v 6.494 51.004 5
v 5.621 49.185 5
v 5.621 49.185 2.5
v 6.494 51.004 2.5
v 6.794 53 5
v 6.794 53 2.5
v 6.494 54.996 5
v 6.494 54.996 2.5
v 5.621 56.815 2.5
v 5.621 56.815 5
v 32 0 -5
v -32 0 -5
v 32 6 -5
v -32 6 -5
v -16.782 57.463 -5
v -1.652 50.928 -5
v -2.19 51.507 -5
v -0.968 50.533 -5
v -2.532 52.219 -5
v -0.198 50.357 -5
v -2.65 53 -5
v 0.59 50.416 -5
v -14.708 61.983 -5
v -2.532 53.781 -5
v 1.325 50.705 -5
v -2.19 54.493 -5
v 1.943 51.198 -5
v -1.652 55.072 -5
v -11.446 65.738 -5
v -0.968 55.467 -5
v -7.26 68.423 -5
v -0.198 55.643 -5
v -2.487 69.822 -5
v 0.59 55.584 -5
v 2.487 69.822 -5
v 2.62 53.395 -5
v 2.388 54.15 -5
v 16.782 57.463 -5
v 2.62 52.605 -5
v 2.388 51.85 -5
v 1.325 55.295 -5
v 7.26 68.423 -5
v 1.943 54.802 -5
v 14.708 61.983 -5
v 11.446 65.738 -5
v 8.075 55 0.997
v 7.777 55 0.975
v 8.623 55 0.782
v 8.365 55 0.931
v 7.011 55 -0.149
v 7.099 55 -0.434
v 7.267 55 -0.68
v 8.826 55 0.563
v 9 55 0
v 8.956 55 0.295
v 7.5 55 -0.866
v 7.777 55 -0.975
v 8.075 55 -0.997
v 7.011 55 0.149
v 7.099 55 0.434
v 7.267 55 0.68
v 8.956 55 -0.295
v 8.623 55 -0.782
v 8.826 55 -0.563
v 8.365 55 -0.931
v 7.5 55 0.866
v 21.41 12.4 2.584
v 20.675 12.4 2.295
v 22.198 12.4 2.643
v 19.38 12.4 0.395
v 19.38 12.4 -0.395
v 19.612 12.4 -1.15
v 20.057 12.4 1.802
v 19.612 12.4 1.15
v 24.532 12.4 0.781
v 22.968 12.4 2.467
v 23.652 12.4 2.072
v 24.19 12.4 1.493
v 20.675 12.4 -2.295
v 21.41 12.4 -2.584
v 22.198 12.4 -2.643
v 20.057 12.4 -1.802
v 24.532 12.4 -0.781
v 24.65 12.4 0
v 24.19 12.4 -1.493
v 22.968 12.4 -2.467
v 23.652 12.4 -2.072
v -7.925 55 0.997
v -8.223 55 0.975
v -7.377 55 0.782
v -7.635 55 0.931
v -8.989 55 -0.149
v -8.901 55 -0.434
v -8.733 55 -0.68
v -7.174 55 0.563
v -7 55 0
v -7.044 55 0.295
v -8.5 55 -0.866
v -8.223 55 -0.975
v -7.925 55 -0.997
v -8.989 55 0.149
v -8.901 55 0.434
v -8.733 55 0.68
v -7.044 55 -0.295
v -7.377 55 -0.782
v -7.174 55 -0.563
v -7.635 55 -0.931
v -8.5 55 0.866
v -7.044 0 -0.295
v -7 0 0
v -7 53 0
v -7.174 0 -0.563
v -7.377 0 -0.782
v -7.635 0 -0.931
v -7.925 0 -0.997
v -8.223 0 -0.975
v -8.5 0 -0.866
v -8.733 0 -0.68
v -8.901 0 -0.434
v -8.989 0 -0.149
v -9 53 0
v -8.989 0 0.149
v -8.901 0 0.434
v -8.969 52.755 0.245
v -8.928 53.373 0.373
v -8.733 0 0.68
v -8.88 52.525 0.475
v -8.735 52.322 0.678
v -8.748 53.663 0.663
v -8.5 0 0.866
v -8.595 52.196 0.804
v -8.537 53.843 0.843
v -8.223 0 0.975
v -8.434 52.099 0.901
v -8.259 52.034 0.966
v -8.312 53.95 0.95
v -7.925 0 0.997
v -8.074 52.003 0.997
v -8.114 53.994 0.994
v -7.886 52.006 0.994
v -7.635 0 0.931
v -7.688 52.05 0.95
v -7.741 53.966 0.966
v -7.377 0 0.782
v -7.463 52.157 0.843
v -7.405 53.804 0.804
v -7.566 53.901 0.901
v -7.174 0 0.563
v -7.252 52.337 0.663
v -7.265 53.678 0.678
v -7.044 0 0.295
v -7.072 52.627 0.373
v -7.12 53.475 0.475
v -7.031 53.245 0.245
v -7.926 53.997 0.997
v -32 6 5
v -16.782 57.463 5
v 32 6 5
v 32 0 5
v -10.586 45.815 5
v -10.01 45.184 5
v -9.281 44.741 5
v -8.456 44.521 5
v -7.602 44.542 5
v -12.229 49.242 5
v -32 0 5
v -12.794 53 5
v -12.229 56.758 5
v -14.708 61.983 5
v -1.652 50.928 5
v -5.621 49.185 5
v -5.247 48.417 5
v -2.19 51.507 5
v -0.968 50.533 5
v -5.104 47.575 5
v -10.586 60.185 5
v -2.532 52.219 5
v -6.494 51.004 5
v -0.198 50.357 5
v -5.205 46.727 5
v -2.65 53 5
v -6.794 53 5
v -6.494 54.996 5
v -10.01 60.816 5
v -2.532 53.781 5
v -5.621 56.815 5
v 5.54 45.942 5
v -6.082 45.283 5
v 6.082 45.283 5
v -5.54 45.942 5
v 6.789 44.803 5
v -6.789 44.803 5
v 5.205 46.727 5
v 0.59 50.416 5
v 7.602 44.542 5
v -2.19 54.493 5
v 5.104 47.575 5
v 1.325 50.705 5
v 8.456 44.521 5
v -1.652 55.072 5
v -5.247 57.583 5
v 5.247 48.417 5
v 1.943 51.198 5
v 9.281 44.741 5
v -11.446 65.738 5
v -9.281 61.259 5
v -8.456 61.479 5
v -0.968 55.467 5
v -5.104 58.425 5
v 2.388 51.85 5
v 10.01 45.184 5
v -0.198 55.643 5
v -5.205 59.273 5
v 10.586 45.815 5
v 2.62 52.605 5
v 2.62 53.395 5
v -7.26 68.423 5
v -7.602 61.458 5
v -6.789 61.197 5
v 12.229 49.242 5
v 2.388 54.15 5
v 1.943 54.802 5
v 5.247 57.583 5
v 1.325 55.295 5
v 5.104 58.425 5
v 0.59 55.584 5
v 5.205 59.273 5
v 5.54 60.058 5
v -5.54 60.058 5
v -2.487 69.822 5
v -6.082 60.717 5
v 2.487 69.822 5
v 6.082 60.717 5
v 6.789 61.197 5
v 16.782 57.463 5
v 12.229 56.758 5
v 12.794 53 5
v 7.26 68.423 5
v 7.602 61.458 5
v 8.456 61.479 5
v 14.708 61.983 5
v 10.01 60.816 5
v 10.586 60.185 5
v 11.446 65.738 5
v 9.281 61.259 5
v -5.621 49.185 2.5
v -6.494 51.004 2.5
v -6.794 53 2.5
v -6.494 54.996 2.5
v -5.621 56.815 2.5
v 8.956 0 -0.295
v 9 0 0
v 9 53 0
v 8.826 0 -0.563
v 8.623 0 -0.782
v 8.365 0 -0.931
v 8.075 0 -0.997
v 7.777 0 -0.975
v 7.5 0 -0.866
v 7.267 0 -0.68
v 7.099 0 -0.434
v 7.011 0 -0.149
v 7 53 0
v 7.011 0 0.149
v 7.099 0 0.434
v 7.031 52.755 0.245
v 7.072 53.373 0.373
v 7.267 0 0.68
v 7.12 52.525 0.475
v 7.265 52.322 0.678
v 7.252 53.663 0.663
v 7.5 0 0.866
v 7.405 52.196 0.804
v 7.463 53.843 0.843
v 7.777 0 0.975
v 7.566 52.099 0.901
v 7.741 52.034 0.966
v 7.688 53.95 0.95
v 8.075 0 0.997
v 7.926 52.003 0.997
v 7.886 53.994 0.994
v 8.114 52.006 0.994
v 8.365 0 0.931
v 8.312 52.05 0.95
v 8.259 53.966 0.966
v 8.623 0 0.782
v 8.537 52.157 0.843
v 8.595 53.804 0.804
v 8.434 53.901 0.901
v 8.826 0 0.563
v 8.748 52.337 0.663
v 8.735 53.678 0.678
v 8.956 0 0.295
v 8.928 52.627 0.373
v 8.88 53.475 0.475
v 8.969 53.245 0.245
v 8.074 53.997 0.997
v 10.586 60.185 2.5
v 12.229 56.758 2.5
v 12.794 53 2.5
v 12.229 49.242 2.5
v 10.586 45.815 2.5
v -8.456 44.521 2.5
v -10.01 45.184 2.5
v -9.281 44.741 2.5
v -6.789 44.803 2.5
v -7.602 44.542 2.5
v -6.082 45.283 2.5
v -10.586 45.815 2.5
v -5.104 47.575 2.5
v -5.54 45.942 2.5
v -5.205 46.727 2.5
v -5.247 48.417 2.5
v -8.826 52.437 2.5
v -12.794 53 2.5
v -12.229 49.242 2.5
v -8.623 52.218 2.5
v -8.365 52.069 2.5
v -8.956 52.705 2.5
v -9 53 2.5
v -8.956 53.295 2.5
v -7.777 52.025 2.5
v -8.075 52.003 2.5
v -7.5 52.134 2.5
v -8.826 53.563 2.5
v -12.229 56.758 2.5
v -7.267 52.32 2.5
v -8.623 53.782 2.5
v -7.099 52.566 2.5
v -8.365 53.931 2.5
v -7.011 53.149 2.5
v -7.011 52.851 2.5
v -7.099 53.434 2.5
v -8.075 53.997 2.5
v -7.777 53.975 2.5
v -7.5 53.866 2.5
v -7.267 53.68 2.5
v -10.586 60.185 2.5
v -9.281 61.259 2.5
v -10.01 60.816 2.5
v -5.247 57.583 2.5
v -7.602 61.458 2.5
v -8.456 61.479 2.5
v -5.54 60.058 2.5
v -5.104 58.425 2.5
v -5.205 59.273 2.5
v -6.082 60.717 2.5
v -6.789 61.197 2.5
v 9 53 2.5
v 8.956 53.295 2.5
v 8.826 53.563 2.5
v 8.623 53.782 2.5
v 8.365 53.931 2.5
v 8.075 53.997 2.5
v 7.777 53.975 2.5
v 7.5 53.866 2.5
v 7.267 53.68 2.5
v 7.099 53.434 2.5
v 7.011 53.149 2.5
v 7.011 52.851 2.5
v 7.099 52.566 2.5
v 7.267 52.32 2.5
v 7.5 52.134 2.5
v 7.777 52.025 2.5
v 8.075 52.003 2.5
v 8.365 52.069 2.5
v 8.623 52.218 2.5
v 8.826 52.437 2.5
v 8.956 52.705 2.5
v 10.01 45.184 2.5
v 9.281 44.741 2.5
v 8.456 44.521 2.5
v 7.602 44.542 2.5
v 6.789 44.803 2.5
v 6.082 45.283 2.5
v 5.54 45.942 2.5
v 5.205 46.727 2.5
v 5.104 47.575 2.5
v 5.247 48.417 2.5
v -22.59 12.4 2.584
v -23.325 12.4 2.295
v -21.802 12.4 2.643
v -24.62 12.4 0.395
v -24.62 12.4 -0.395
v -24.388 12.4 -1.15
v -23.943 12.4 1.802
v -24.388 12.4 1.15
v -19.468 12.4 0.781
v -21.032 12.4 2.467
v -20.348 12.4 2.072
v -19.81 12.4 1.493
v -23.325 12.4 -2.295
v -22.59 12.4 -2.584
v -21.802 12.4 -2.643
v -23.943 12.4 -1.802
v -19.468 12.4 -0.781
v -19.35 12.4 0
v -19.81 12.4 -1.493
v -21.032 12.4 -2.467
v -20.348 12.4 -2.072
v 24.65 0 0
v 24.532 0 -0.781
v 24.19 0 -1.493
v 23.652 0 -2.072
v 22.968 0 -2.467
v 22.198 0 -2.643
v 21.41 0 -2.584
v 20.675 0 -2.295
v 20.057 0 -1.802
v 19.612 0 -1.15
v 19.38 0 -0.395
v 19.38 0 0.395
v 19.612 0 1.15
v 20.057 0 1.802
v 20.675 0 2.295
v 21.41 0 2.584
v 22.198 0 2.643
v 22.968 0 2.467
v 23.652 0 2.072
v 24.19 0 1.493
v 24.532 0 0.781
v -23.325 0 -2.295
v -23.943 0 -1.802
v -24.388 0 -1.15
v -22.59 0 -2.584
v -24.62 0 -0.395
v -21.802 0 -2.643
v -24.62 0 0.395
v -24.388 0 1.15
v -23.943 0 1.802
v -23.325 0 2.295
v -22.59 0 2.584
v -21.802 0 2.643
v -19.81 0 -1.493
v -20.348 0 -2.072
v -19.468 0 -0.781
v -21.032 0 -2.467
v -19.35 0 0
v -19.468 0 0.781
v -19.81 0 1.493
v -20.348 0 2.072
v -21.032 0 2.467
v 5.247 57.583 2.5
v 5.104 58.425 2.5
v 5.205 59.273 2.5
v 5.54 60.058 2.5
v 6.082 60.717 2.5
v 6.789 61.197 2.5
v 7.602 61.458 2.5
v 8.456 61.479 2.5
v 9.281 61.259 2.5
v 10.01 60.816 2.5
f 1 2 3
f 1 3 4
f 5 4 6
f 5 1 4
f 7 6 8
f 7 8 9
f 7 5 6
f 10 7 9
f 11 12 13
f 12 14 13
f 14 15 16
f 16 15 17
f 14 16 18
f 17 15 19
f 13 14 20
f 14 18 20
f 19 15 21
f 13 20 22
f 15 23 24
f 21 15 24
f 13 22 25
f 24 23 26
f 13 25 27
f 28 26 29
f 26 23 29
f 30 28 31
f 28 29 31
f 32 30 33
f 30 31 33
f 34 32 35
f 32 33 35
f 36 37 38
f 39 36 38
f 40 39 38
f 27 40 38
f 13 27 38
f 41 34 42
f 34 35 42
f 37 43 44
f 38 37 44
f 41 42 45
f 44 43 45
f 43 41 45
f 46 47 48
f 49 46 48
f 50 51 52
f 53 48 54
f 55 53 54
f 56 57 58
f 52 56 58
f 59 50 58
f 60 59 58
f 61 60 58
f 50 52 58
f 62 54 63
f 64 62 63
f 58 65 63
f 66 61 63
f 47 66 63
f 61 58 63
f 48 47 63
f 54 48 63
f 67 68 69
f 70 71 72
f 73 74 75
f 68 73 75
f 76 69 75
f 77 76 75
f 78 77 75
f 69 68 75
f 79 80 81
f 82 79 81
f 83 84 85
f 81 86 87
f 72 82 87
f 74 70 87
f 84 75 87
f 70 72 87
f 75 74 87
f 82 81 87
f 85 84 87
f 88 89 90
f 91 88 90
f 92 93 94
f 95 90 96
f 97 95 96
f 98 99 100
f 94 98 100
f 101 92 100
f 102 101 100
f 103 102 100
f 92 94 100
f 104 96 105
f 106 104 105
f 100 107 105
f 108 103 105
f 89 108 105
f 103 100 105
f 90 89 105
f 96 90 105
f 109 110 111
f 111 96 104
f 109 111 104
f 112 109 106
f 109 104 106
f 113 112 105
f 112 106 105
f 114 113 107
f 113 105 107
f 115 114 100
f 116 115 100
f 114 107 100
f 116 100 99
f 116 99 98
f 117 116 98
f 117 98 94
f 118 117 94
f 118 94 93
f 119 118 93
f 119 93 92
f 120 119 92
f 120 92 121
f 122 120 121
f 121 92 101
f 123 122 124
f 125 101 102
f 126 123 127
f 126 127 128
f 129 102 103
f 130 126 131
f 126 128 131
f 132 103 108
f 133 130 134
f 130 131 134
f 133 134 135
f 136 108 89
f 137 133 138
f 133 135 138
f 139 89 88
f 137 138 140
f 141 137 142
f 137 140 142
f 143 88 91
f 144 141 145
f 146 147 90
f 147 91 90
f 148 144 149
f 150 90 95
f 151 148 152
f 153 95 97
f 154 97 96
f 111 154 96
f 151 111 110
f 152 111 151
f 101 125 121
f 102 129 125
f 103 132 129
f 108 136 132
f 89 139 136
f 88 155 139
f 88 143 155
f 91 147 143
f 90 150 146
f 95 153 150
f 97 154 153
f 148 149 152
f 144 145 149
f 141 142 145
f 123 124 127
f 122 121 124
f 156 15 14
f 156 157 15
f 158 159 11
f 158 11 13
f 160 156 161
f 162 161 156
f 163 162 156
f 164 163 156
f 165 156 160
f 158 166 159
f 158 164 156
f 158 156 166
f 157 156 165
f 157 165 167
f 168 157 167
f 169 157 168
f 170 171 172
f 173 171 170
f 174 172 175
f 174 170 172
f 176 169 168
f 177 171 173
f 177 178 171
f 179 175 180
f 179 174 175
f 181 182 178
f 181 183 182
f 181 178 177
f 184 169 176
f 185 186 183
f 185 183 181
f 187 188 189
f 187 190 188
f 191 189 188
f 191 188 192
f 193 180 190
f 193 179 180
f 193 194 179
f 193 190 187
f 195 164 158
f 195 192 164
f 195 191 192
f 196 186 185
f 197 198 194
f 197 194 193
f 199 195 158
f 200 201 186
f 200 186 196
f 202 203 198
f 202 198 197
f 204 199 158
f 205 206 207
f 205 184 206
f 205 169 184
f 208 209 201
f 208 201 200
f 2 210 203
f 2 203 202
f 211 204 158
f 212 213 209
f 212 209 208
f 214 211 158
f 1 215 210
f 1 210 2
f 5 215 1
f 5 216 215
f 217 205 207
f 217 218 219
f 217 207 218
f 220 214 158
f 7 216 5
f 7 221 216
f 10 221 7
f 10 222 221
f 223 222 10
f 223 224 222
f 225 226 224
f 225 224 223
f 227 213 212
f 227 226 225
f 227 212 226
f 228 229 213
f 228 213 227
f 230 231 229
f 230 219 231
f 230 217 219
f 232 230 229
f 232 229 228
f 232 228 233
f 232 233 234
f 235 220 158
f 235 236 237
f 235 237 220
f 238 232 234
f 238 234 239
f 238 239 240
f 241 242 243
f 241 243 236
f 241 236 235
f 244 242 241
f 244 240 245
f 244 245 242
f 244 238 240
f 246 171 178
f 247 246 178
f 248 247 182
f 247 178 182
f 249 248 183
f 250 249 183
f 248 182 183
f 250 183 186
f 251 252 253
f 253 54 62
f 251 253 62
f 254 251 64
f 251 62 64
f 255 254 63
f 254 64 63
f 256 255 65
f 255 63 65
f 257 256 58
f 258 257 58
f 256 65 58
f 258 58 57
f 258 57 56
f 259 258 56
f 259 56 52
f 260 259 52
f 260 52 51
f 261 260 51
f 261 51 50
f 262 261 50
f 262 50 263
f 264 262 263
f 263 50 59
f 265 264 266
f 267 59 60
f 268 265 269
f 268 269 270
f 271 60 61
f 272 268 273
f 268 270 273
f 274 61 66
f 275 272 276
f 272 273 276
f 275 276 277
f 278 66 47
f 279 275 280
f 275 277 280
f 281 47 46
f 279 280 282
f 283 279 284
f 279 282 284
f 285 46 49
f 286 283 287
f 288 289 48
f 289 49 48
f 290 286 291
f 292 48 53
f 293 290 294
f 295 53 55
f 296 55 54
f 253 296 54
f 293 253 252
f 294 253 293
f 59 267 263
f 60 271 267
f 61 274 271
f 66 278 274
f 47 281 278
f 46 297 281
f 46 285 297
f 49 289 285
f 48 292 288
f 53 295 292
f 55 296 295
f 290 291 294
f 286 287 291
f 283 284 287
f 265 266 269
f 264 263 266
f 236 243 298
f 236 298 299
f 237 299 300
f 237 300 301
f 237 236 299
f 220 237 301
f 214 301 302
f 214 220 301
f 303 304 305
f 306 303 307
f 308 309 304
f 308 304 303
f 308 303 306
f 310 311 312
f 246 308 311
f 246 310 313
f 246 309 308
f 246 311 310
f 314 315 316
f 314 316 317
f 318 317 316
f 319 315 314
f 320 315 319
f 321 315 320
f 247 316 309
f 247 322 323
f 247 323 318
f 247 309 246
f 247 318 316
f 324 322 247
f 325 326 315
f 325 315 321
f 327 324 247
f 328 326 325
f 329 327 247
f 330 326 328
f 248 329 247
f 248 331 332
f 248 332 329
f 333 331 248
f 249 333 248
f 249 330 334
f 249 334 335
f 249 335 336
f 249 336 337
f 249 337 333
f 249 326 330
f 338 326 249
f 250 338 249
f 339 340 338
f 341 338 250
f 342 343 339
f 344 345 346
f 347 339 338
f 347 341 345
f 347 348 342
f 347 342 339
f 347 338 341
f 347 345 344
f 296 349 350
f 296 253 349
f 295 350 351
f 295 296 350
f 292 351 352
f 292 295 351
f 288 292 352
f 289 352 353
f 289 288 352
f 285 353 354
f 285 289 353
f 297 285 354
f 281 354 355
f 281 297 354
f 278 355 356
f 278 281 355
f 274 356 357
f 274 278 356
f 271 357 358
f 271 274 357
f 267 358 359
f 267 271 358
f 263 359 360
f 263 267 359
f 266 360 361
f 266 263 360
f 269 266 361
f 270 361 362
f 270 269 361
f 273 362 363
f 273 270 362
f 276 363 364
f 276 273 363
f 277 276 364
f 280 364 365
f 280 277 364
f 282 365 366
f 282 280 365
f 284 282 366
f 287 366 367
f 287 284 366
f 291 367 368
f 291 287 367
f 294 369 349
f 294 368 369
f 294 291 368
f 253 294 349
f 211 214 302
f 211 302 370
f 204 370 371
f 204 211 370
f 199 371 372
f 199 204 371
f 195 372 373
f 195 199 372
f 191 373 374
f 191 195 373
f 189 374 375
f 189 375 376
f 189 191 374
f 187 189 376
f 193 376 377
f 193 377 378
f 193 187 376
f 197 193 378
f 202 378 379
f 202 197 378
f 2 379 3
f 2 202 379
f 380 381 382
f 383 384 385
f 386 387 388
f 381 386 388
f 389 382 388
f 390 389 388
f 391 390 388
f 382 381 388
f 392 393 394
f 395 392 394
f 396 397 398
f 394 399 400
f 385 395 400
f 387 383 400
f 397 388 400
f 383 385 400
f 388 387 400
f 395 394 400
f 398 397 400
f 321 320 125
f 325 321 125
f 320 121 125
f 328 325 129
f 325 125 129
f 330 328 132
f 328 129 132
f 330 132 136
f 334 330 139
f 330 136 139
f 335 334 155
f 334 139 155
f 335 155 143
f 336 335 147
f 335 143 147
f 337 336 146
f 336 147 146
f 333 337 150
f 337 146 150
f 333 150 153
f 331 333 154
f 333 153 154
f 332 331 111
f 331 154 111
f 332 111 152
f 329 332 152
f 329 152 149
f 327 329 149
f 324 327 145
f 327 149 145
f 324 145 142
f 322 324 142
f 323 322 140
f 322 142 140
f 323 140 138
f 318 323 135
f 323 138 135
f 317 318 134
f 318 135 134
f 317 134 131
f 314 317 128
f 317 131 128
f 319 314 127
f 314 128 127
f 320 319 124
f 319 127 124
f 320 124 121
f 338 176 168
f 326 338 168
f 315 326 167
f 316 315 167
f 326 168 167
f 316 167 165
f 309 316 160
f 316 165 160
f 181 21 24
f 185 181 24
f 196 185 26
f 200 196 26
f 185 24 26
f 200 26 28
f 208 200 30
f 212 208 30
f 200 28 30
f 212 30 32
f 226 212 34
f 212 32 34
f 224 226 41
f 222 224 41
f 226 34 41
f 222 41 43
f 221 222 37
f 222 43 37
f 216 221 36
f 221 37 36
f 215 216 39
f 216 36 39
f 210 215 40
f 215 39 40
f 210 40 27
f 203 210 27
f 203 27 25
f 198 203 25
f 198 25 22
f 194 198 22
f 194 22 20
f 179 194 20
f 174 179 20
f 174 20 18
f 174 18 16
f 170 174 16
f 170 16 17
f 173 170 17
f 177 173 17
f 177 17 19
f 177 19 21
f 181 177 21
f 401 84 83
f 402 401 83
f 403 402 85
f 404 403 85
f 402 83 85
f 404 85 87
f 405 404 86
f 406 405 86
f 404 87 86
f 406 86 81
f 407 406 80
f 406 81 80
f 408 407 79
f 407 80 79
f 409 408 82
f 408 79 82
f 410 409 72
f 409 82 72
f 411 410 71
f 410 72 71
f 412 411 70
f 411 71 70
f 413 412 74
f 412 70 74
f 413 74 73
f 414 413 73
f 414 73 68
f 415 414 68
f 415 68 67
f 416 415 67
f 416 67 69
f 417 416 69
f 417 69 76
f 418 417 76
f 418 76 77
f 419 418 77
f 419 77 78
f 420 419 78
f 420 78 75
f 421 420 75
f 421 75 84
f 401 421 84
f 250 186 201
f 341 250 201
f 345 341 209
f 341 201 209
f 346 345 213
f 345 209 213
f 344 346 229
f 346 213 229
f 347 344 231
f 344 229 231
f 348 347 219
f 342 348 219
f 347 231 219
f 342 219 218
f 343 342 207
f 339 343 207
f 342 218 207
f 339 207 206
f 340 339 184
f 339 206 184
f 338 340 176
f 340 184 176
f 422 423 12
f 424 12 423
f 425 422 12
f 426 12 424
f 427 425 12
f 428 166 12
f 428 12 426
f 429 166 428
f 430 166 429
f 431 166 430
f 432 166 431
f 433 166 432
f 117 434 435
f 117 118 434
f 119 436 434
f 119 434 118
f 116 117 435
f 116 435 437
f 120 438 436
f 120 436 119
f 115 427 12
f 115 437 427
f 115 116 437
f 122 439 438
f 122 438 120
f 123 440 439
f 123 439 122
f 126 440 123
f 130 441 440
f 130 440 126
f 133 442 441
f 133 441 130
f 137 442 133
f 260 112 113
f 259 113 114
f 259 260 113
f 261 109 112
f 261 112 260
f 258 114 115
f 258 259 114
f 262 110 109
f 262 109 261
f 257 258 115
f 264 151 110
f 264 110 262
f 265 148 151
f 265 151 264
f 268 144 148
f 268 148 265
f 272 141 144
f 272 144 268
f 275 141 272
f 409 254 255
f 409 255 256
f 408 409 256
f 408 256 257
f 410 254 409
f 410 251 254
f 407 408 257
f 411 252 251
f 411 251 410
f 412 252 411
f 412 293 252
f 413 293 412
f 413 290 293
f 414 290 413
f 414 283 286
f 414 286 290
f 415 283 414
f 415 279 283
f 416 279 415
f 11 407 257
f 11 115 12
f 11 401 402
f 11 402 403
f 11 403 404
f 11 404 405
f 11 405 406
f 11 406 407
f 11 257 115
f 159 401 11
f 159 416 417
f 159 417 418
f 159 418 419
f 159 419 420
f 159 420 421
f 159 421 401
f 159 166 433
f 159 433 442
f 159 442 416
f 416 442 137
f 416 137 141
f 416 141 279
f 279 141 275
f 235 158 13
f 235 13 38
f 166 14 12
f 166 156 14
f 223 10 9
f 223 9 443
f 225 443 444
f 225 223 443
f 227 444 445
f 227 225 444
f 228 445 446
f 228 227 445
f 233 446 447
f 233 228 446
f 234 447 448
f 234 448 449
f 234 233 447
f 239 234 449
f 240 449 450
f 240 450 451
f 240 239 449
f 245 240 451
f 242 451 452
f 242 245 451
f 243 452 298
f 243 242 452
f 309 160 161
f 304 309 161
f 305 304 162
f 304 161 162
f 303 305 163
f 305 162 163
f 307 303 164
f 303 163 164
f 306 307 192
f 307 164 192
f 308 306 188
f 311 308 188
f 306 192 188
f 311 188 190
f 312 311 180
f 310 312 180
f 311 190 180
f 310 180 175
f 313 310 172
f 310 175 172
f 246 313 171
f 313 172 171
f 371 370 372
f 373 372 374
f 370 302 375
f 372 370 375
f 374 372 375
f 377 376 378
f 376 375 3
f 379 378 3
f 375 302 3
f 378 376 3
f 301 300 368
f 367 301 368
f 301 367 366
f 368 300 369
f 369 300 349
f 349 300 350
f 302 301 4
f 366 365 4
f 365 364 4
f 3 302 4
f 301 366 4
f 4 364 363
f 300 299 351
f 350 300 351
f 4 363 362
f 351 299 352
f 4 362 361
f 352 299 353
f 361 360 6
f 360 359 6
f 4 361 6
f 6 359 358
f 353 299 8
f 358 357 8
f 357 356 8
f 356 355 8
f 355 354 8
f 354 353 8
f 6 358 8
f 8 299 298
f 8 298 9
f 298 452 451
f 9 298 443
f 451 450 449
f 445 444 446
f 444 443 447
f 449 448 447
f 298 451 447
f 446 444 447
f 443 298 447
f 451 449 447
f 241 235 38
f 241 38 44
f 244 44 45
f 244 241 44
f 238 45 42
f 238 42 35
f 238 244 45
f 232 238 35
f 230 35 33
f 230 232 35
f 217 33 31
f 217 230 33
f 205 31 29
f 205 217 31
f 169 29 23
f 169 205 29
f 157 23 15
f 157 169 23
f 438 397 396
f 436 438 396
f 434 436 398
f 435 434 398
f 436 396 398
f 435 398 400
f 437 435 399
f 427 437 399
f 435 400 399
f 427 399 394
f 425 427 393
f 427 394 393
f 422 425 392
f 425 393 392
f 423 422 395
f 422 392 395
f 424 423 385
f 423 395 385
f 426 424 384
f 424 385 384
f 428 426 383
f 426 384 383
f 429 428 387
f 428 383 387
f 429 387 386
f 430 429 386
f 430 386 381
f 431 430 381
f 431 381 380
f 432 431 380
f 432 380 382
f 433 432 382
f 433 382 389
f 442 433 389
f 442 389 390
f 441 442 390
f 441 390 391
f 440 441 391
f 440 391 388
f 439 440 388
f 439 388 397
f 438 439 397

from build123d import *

# Parameters (mm, degrees)
EXTRUDE_1_DEPTH           = 5
HOLE_WIZARD_M5_1_D        = 5.3
CUT_EXTRUDE_1_DEPTH       = 2.5
HOLE_WIZARD_2_0_2_1_D     = 2
HOLE_WIZARD_2_0_2_1_DEPTH = 5
HOLE_WIZARD_2_0_2_2_D     = 2
HOLE_WIZARD_2_0_2_2_DEPTH = 55
HOLE_WIZARD_M5_2_D        = 5.3
HOLE_WIZARD_M5_2_DEPTH    = 12.4


with BuildPart() as part:
    # 스케치1 → 보스-돌출1 (new, symmetric)
    with BuildSketch(Plane.XY):
        with BuildLine():
            Line((-32, 0), (32, 0))
            Line((32, 0), (32, 6))
            Line((32, 6), (16.781610859, 57.462613925))
            ThreePointArc((16.781610859, 57.462613925), (0, 70), (-16.781610859, 57.462613925))
            Line((-16.781610859, 57.462613925), (-32, 6))
            Line((-32, 6), (-32, 0))
        make_face()
    extrude(amount=EXTRUDE_1_DEPTH, both=True)

    # M5 여유 구멍1 (through all)
    with Locations(Plane.XY.offset(5)):
        with Locations((0, 53)):
            Hole(HOLE_WIZARD_M5_1_D / 2)

    # 스케치4 → 컷-돌출1 (cut)
    with BuildSketch(Plane.XY.offset(5)):
        with BuildLine():
            ThreePointArc((-10.585585486, 60.184777453), (-12.793578355, 53), (-10.585585486, 45.815222547))
            ThreePointArc((-10.585585486, 45.815222547), (-6.418566116, 45.017758083), (-5.621101652, 49.184777453))
            ThreePointArc((-5.621101652, 49.184777453), (-6.793578355, 53), (-5.621101652, 56.815222547))
            ThreePointArc((-5.621101652, 56.815222547), (-6.418566116, 60.982241917), (-10.585585486, 60.184777453))
        make_face()
    cut_extrude_1 = extrude(amount=-CUT_EXTRUDE_1_DEPTH, mode=Mode.SUBTRACT)

    # Ø2.0 (2) 지름 구멍1
    with Locations(Plane.XY.offset(5)):
        with Locations((-8, 53)):
            hole_wizard_2_0_2_1 = Hole(HOLE_WIZARD_2_0_2_1_D / 2, depth=HOLE_WIZARD_2_0_2_1_DEPTH)

    # 대칭 복사1: 컷-돌출1, Ø2.0 (2) 지름 구멍1 across plane
    add(cut_extrude_1.mirror(Plane(origin=(0, 0, 0), x_dir=(0, 0, 1), z_dir=(1, 0, 0))), mode=Mode.SUBTRACT)
    add(hole_wizard_2_0_2_1.mirror(Plane(origin=(0, 0, 0), x_dir=(0, 0, 1), z_dir=(1, 0, 0))), mode=Mode.SUBTRACT)

    # Ø2.0 (2) 지름 구멍2
    with Locations(Plane(origin=(0, 0, 0), x_dir=(-1, 0, 0), z_dir=(0, -1, 0))):
        with Locations((-8, 0), (8, 0)):
            Hole(HOLE_WIZARD_2_0_2_2_D / 2, depth=HOLE_WIZARD_2_0_2_2_DEPTH)

    # M5 여유 구멍2
    with Locations(Plane(origin=(0, 0, 0), x_dir=(-1, 0, 0), z_dir=(0, -1, 0))):
        with Locations((-22, 0), (22, 0)):
            Hole(HOLE_WIZARD_M5_2_D / 2, depth=HOLE_WIZARD_M5_2_DEPTH)


solid = part.part
